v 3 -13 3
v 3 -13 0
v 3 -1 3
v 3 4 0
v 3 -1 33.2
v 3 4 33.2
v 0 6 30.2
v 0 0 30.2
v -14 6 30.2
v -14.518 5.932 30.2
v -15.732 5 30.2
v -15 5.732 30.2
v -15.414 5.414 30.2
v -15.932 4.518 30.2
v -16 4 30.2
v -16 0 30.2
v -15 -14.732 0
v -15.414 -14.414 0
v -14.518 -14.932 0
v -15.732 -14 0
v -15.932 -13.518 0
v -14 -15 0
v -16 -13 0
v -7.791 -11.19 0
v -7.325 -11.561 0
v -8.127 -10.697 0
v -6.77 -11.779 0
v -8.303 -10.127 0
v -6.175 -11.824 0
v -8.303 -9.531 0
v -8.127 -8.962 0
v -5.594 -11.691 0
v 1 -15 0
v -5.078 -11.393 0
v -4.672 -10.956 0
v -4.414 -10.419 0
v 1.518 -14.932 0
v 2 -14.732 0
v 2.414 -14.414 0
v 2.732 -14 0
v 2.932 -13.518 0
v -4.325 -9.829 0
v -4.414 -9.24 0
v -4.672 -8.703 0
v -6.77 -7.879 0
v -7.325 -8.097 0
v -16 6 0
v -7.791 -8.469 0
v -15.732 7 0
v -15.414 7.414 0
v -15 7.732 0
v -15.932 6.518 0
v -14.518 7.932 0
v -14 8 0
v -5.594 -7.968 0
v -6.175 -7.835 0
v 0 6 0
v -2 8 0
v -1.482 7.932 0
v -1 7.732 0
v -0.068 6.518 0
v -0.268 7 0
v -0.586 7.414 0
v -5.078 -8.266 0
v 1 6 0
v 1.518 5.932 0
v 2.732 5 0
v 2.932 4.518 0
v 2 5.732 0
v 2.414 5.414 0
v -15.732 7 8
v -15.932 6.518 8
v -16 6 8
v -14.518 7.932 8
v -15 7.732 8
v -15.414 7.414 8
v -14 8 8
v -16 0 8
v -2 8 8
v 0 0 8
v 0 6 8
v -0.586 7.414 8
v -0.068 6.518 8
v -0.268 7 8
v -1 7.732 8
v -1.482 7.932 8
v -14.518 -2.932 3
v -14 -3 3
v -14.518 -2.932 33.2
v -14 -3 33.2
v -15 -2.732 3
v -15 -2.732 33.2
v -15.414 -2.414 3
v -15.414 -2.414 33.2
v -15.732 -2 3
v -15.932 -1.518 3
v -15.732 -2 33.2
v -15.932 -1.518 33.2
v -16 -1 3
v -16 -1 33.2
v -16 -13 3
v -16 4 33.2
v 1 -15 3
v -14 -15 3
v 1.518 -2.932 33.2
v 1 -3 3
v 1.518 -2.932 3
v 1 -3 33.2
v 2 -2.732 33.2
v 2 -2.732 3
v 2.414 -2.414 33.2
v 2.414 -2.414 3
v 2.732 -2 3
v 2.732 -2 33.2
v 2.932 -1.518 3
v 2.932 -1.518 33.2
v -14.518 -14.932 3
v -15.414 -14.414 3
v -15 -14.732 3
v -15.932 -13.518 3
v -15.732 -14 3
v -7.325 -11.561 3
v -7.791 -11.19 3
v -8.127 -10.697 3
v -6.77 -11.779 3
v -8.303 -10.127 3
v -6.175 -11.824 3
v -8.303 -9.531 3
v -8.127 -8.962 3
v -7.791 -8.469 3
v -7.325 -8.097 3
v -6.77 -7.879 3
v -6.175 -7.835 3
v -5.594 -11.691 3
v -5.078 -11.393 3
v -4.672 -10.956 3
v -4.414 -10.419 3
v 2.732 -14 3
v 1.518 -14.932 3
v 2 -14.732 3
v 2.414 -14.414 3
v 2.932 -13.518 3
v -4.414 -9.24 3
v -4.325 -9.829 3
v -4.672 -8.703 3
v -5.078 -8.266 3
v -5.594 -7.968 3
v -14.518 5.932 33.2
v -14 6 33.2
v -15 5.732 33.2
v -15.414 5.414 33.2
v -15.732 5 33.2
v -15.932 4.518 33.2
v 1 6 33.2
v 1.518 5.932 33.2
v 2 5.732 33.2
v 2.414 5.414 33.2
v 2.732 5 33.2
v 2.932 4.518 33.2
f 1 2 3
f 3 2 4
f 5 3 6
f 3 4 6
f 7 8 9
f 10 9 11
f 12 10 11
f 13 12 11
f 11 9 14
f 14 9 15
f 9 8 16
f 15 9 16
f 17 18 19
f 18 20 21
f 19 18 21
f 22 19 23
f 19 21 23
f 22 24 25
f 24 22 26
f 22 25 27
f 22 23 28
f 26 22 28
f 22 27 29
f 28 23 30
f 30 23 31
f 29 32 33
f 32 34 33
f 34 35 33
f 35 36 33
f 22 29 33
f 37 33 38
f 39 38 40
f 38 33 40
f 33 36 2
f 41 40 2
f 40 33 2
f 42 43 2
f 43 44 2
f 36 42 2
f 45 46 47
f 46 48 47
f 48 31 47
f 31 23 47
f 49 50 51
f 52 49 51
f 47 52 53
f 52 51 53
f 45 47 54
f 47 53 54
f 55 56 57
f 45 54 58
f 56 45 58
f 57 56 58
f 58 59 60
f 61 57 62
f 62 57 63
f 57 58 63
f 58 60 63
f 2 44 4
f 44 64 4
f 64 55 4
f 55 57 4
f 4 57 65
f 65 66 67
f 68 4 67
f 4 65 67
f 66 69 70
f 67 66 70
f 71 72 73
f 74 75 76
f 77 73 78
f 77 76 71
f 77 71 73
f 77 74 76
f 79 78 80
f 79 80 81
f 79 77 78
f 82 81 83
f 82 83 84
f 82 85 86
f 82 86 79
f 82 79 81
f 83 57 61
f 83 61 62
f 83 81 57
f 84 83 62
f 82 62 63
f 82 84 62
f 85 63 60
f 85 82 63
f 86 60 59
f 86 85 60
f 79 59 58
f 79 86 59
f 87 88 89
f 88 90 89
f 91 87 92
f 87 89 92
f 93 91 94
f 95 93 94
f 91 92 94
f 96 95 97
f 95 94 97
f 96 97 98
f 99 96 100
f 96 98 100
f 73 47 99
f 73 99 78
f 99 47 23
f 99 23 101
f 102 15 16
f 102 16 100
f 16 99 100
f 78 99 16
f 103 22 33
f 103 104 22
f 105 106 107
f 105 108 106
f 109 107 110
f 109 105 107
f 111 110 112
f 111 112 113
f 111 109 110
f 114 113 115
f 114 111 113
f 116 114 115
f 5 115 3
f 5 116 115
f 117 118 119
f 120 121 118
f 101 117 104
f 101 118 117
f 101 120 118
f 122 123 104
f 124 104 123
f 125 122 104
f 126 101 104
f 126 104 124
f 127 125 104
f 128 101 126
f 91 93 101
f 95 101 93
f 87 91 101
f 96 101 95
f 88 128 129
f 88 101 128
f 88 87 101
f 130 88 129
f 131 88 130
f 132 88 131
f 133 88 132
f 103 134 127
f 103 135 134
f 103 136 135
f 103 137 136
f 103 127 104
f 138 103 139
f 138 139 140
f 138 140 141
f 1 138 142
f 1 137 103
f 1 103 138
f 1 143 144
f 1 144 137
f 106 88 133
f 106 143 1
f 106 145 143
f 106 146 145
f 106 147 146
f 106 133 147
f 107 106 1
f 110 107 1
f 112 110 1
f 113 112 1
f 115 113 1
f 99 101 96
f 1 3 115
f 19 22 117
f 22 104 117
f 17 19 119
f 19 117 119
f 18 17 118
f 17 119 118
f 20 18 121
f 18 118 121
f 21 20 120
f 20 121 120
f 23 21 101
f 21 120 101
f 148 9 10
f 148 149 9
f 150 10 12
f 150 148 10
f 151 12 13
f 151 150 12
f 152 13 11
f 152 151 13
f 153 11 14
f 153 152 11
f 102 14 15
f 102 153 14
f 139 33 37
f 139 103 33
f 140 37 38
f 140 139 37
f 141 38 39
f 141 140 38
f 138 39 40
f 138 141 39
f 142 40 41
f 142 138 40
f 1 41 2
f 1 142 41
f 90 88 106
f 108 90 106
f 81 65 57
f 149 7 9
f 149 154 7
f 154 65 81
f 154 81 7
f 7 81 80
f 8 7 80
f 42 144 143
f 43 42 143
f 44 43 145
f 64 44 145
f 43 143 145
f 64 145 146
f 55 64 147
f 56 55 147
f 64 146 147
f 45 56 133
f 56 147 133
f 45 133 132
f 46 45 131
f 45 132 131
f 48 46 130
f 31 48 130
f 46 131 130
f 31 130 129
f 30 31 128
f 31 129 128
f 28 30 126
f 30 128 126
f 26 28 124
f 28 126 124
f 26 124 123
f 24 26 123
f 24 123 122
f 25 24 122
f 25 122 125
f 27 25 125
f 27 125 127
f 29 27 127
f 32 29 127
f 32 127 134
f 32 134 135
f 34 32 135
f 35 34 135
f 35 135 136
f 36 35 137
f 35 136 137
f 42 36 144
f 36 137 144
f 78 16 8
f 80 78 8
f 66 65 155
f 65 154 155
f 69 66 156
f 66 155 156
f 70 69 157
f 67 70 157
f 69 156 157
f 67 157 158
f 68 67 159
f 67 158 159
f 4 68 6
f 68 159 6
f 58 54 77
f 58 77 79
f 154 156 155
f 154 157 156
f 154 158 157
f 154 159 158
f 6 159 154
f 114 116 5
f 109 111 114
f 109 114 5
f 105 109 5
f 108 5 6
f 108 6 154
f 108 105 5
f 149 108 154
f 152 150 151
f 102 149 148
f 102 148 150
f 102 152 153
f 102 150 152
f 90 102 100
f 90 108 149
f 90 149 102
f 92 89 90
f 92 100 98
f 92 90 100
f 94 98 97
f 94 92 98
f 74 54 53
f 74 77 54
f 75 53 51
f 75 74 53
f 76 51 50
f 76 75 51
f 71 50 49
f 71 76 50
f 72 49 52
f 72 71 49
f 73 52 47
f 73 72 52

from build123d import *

# Parameters (mm, degrees)
F0_W     = 16
F0_H     = 8
F1_DEPTH = 8
F2_W     = 16
F2_H     = 3
F3_DEPTH = 33.2
F4_W     = 19
F4_H     = 3
F5_DEPTH = 12
F6_R     = 2
F7_DEPTH = 3
F8_W     = 16
F8_H     = 3
F9_DEPTH = 6
F10_R    = 1.99999


# Not quite as in the source:
# - a fillet or chamfer is up to 0.001 mm smaller than in the source, because OpenCascade refuses the exact size


with BuildPart() as f1:
    # F0 (on Top) → F1 (new body)
    with BuildSketch(Plane.XY):
        with Locations((-8, 4)):
            Rectangle(F0_W, F0_H)
    extrude(amount=F1_DEPTH)

    # F2 (on Top) → F3 (join)
    with BuildSketch(Plane.XY):
        with Locations((-8, -1.5)):
            Rectangle(F2_W, F2_H)
        Polygon((0, 6), (0, 0), (0, -3), (3, -3), (3, 6), align=None)
    extrude(amount=F3_DEPTH)

    # F4 (on face) → F5 (join)
    with BuildSketch(Plane.XZ.offset(3)):
        with Locations((-6.5, 1.5)):
            Rectangle(F4_W, F4_H)
    extrude(amount=F5_DEPTH)

    # F6 (on face) → F7 (cut, through all)
    with BuildSketch(Plane.XY.offset(3)):
        with Locations((-6.3249543309, -9.8292976618)):
            Circle(F6_R)
    extrude(amount=-F7_DEPTH, mode=Mode.SUBTRACT)

    # F8 (on face) → F9 (join)
    with BuildSketch(Plane(origin=(0, 0, 0), x_dir=(-1, 0, 0), z_dir=(0, 1, 0))):
        with Locations((8, 31.7)):
            Rectangle(F8_W, F8_H)
    extrude(amount=F9_DEPTH)

    # F10 (radius 2 in the source; OpenCascade refuses exactly that, so slightly less here)
    f10_edges = [f1.edges().sort_by_distance(p)[0] for p in [
        (-16, 6, 31.7),
        (-16, 8, 4),
        (0, 8, 4),
        (3, 6, 16.6),
        (3, -15, 1.5),
        (3, -3, 18.1),
        (-16, -3, 18.1),
        (-16, -15, 1.5),
    ]]
    fillet(f10_edges, radius=F10_R)


solid = f1.part
